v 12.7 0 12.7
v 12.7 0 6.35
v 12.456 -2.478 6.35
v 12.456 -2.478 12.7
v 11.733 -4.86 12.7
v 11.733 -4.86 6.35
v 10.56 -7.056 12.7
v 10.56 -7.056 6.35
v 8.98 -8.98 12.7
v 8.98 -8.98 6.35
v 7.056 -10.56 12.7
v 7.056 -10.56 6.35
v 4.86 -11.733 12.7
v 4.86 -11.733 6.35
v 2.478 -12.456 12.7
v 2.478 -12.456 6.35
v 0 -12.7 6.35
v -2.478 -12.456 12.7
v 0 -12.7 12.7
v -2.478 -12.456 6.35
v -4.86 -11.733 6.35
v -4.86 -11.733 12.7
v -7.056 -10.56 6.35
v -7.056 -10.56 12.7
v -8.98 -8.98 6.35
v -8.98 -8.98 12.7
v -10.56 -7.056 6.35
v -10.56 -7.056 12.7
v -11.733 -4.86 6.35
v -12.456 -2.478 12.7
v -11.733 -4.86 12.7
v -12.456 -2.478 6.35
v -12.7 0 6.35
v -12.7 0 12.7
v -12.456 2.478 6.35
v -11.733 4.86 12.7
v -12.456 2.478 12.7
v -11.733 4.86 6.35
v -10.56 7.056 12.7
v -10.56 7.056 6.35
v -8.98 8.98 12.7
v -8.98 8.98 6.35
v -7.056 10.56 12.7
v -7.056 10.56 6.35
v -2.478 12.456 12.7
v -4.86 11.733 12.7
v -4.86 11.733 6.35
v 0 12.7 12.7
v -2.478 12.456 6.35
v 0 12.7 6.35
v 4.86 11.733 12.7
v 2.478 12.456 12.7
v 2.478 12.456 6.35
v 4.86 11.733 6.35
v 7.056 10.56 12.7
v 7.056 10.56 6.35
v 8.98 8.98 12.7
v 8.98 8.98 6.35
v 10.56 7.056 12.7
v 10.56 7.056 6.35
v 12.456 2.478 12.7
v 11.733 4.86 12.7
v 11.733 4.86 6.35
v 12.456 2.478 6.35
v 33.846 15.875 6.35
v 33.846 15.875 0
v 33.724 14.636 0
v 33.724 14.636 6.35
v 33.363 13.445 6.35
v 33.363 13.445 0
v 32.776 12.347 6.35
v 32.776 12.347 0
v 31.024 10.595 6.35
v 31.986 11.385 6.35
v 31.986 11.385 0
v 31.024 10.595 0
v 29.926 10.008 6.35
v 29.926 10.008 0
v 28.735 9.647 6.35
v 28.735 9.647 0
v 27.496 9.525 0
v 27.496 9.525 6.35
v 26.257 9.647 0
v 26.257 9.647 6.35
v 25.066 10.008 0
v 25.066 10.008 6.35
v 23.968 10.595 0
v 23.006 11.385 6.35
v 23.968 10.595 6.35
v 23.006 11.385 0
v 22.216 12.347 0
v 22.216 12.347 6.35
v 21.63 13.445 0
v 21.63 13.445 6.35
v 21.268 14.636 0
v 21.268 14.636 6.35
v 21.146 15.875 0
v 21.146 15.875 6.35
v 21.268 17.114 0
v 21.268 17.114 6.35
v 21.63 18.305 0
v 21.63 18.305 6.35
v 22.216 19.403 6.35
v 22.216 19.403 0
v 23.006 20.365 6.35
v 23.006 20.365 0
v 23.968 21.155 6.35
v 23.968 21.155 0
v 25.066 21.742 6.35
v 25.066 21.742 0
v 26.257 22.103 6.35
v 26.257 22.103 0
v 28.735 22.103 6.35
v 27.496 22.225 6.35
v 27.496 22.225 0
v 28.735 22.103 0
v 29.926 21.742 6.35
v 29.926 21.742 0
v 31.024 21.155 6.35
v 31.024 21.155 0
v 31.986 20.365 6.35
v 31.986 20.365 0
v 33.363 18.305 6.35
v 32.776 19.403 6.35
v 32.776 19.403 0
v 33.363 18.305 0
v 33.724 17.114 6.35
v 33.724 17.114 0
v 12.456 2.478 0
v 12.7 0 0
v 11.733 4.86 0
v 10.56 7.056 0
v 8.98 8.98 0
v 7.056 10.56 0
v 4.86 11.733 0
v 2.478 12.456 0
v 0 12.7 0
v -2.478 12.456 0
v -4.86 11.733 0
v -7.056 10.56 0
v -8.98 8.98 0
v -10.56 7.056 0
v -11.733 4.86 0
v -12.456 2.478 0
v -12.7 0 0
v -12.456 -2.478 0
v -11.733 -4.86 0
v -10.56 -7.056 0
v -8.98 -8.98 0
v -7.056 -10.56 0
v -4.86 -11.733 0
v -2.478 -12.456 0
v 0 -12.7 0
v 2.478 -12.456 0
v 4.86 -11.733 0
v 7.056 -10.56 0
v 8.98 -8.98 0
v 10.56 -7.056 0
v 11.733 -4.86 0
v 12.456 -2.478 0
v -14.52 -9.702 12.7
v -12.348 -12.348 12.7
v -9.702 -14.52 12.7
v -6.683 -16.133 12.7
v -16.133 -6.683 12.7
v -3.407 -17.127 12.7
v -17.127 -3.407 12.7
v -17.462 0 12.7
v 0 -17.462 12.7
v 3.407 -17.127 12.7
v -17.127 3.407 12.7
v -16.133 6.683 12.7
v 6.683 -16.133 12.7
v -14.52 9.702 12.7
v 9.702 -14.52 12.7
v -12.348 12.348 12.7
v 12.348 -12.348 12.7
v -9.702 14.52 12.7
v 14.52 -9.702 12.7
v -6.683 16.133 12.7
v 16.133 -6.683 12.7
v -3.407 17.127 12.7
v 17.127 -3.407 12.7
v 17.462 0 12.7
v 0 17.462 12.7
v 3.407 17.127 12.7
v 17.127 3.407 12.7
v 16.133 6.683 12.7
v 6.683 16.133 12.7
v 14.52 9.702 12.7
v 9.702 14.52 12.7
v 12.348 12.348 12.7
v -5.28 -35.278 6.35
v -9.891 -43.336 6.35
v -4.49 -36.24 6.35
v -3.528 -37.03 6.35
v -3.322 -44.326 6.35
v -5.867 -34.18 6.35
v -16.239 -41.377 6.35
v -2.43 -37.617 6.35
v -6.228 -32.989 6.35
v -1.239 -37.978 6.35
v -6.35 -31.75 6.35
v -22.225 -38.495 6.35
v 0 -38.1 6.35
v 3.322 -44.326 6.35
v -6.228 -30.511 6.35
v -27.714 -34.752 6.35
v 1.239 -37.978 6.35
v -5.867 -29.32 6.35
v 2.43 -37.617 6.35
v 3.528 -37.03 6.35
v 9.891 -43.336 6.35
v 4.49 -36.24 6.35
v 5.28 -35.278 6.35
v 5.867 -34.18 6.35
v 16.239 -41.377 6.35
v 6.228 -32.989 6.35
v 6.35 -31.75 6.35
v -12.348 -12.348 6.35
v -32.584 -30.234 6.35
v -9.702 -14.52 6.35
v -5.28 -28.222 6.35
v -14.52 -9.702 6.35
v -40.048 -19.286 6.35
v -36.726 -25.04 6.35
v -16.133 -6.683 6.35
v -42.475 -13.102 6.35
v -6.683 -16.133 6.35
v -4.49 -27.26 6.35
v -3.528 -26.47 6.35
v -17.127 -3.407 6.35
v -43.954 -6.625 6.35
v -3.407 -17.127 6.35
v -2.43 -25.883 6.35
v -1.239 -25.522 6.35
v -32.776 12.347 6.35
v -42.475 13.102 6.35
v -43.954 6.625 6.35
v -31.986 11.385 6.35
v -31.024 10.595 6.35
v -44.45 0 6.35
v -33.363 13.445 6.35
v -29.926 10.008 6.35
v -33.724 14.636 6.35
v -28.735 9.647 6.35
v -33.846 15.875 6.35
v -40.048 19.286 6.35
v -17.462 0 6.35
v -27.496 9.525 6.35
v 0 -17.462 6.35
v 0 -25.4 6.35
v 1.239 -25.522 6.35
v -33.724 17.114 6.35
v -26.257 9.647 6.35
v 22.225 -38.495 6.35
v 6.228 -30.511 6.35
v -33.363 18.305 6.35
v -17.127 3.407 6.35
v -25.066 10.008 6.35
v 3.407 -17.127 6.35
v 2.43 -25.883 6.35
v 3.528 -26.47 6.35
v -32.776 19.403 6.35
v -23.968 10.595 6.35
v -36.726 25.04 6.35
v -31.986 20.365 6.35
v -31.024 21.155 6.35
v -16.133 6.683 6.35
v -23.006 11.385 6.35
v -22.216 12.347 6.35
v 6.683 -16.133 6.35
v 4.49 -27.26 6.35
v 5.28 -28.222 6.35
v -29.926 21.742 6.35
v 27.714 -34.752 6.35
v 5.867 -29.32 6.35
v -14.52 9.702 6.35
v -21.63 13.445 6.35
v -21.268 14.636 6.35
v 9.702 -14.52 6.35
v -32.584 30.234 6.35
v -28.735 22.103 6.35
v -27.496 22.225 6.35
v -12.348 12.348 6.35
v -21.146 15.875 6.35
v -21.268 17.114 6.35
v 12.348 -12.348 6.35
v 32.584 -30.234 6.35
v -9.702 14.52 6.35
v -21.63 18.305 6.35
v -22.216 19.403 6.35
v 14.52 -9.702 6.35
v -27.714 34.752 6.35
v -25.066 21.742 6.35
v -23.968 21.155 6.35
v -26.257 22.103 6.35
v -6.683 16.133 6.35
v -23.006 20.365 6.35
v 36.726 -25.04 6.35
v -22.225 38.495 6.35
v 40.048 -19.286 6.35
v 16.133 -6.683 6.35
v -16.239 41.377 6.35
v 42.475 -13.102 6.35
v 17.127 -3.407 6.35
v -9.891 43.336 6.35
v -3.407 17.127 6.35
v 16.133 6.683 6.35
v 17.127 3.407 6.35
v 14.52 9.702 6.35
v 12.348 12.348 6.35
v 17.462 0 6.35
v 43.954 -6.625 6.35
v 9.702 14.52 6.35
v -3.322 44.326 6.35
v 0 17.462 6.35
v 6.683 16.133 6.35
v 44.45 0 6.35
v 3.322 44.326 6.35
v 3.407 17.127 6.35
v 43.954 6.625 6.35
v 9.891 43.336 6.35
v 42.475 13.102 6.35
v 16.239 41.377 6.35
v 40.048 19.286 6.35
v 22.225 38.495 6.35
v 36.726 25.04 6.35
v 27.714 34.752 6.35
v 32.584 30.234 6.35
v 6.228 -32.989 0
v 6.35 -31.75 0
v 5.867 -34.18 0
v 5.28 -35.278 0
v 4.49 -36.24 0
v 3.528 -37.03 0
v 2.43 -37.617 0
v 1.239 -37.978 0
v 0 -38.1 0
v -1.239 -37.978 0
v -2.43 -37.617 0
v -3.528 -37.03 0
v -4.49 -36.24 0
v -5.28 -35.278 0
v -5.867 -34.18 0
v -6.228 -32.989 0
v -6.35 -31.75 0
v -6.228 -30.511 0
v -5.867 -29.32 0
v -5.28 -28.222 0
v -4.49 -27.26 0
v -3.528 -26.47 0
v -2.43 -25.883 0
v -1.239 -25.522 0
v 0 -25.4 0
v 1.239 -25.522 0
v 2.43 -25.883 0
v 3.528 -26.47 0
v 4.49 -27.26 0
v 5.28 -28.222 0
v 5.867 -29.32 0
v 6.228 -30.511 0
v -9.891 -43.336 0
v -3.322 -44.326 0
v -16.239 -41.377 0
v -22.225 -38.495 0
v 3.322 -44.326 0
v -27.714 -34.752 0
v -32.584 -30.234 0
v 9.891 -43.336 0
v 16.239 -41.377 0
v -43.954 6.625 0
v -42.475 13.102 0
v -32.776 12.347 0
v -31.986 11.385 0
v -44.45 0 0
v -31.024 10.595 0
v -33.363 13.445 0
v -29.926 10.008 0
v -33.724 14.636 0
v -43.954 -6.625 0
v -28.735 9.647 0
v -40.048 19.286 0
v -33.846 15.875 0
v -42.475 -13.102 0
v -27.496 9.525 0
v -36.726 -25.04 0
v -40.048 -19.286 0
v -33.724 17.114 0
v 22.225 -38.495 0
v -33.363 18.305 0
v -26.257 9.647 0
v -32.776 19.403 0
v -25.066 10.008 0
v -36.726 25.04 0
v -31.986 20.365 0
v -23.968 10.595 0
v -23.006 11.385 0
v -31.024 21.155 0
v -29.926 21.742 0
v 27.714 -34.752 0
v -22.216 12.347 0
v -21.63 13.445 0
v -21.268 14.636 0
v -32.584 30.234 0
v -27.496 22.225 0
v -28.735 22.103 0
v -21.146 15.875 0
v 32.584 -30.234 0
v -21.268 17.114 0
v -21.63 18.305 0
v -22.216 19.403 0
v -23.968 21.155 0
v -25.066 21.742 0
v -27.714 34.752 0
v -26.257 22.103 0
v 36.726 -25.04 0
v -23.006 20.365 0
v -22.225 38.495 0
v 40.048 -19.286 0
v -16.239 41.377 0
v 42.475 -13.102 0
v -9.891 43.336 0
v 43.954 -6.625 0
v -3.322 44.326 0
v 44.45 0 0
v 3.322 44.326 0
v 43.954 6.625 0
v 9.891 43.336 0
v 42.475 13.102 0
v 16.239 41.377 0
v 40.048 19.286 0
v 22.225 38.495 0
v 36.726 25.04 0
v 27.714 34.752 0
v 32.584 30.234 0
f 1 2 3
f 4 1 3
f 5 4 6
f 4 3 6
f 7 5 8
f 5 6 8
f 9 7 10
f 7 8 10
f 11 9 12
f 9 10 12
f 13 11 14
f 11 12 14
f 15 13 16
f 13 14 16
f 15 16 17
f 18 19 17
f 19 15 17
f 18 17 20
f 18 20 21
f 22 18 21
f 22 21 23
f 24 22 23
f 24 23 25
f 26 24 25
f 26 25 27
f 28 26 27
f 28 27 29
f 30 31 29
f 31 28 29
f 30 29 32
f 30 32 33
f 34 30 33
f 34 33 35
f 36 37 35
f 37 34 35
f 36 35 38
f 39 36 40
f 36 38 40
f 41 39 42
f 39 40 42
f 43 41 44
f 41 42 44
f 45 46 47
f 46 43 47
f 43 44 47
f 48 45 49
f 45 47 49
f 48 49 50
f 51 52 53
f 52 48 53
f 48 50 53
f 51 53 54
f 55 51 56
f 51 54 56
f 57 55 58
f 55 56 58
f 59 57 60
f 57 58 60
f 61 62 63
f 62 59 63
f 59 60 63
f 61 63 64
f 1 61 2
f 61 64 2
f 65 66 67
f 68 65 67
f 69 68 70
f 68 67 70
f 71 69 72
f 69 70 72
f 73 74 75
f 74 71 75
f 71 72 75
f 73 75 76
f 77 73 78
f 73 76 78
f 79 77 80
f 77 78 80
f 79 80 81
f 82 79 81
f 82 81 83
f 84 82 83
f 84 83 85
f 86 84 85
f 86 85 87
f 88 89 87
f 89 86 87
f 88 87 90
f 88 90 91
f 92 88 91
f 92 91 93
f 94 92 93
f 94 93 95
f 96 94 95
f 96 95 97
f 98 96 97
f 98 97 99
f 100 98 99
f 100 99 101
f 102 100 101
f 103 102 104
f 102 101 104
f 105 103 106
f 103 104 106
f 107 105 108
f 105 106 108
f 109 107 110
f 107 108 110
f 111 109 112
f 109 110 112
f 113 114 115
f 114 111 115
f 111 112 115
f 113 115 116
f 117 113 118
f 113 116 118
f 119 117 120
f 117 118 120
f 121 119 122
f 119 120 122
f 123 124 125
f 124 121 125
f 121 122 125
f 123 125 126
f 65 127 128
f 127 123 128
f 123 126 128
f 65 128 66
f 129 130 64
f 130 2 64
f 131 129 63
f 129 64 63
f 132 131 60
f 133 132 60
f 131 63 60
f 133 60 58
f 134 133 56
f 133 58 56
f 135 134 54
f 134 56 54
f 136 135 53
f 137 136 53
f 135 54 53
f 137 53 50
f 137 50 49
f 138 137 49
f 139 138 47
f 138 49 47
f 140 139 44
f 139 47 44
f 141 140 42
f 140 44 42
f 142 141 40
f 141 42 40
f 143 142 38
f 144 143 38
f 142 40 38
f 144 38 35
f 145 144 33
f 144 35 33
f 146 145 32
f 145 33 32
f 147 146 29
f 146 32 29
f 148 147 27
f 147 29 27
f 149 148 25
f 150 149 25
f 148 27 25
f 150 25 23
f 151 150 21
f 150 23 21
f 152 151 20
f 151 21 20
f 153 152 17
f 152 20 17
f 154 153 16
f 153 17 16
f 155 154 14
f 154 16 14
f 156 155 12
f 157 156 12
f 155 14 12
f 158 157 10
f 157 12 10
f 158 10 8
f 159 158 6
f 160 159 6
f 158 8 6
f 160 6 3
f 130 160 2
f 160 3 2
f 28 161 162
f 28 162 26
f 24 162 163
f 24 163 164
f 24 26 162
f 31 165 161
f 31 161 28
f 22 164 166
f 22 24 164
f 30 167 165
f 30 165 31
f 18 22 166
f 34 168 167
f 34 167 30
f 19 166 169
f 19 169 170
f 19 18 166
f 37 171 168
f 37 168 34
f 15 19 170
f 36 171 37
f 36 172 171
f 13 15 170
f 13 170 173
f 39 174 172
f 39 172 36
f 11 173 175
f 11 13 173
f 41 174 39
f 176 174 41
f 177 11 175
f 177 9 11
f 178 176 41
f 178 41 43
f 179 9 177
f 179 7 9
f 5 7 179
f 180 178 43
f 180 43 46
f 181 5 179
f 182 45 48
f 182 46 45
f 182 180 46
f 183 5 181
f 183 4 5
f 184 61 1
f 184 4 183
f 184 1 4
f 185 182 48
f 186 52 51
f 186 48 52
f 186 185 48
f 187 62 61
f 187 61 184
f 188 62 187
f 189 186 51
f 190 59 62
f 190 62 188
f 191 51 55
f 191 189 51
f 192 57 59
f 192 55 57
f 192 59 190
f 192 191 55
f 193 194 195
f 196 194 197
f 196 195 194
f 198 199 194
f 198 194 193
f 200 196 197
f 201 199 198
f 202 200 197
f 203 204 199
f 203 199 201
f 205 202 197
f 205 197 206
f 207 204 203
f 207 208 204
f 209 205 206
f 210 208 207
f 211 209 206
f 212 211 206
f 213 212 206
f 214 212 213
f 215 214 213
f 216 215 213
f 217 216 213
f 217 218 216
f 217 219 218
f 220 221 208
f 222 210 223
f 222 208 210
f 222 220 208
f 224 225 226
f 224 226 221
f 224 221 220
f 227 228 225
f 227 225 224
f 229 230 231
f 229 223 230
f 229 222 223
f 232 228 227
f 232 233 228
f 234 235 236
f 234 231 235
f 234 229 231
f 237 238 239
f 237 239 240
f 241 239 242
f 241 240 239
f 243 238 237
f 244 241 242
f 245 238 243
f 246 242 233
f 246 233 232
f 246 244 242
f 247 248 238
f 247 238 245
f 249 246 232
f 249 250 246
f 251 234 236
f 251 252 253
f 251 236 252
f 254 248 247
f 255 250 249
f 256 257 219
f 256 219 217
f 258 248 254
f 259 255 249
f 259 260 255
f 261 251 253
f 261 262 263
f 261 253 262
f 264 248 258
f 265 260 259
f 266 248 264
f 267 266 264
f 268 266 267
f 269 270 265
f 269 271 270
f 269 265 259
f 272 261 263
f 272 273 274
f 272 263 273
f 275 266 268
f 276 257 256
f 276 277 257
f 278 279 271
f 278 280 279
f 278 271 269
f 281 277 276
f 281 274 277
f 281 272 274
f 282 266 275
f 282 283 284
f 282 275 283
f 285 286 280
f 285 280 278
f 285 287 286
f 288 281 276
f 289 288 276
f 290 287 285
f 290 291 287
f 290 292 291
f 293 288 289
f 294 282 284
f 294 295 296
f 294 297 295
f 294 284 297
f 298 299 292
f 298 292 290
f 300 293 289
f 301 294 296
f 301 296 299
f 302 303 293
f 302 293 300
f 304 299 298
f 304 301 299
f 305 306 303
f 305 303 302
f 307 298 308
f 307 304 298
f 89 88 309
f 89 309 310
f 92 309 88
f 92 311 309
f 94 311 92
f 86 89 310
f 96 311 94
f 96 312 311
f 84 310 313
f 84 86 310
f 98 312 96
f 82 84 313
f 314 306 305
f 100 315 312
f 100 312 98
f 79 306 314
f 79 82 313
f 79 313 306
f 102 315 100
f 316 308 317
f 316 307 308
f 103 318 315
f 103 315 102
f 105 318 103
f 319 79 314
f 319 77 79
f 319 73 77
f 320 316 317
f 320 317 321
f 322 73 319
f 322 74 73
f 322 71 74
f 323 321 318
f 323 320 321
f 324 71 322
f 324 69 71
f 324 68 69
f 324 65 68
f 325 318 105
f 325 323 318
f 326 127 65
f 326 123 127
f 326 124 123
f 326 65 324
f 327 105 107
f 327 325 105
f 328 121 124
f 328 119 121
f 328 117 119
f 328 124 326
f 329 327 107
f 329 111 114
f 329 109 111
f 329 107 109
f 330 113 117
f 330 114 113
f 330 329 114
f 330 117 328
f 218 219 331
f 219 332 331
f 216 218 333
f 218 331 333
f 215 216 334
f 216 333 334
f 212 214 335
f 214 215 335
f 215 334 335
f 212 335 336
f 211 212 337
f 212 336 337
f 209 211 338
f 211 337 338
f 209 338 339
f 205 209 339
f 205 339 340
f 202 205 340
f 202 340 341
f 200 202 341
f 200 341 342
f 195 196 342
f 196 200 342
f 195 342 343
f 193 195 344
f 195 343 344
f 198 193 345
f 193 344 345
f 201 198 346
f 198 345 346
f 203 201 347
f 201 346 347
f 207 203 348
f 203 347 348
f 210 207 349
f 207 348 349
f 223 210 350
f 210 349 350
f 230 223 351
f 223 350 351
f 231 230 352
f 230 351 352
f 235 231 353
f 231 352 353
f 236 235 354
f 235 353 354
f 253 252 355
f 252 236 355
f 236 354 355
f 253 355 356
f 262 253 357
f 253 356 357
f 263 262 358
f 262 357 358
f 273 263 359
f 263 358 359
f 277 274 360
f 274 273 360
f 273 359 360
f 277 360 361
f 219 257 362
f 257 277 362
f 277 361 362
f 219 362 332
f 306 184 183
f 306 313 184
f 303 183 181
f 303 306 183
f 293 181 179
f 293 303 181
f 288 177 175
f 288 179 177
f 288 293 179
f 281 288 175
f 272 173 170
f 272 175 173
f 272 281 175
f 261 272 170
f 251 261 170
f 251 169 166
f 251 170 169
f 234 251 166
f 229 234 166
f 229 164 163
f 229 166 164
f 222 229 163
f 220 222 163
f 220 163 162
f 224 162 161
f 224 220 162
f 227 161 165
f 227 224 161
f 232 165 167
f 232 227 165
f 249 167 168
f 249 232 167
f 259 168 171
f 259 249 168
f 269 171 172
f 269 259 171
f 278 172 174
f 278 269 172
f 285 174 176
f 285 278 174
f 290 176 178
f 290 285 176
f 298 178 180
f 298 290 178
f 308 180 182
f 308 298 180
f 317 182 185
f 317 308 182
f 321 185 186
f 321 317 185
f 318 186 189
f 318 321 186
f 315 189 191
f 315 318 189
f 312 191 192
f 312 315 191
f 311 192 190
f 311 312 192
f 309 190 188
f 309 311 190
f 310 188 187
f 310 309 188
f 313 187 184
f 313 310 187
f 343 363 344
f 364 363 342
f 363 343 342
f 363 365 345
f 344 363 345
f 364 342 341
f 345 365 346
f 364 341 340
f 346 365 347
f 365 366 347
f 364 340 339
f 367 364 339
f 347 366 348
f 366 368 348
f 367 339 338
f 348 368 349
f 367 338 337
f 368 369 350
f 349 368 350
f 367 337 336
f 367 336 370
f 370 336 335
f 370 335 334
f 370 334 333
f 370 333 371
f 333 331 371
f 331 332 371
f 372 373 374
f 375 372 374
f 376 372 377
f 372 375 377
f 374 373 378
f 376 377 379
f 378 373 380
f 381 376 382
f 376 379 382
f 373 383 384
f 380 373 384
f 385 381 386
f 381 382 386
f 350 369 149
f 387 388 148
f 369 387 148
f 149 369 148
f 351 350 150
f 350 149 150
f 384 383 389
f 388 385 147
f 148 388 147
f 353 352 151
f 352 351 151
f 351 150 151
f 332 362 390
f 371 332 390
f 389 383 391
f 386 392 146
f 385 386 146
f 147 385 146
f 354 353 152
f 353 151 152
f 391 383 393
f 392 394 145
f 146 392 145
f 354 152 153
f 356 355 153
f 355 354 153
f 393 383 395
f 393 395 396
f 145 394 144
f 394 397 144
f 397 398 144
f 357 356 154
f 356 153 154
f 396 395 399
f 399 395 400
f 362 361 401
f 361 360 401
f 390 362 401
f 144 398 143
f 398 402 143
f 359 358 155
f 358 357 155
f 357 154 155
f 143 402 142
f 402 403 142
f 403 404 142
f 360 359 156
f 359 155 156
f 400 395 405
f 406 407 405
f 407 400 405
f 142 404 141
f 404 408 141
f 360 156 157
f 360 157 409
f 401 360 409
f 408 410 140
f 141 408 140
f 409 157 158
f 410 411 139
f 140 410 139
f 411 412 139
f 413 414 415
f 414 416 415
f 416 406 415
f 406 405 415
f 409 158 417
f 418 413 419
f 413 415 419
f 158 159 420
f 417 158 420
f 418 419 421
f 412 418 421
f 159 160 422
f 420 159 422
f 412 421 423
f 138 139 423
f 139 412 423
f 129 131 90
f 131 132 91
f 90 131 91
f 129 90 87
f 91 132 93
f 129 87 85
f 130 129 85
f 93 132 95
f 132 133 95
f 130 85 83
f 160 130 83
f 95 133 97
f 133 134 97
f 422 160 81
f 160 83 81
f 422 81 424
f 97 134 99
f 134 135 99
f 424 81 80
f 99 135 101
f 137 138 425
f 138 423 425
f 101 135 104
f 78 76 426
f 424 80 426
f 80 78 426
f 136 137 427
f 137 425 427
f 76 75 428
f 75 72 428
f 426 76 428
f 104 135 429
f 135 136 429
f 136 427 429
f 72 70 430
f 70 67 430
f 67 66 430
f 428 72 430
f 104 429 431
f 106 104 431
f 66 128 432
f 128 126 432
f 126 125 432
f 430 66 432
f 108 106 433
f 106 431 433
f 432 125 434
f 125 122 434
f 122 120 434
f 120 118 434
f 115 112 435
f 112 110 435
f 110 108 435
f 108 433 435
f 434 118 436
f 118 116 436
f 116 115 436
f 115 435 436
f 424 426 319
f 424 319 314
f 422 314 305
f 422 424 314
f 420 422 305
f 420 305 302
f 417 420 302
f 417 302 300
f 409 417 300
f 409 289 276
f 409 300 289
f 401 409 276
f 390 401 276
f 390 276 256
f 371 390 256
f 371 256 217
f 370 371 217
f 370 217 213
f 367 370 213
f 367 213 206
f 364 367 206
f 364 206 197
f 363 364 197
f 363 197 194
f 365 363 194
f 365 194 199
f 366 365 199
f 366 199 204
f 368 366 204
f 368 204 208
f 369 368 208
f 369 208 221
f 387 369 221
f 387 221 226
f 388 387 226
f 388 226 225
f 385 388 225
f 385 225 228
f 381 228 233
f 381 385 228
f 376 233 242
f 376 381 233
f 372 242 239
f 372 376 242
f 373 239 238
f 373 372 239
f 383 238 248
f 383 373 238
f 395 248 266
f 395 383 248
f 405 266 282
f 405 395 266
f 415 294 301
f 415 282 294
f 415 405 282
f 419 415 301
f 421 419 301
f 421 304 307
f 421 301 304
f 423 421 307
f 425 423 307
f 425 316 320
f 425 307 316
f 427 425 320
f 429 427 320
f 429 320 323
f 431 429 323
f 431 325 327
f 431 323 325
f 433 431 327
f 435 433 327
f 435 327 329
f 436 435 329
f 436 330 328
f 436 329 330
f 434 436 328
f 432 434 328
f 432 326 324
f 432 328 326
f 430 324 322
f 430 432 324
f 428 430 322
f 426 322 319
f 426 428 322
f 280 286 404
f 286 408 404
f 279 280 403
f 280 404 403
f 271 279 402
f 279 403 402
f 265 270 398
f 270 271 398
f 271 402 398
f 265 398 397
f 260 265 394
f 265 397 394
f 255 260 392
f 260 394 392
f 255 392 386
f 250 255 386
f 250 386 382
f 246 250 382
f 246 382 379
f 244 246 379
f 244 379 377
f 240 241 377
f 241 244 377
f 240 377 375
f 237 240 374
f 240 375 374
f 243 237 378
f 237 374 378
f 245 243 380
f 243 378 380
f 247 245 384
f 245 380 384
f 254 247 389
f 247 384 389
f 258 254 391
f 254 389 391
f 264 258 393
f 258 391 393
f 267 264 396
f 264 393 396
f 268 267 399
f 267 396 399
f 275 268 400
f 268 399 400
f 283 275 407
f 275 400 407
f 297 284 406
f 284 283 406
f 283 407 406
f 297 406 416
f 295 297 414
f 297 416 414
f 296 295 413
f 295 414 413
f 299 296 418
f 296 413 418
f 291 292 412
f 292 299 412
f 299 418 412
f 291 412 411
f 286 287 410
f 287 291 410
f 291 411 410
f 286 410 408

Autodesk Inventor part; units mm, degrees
ref_plane "YZ Plane" through (0, 0, 0) normal (1, 0, 0) x (0, 1, 0)
ref_plane "XZ Plane" through (0, 0, 0) normal (0, 1, 0) x (-1, 0, 0)
ref_plane "XY Plane" through (0, 0, 0) normal (0, 0, 1) x (1, 0, 0)
sketch "Sketch1" plane through (0, 0, 0) normal (0, 0, 1) x (1, 0, 0)
  circle A0 centre (0, 0) radius 44.45
  circle A1 centre (-27.4963, 15.875) radius 6.35
  circle A2 centre (27.4963, 15.875) radius 6.35
  circle A3 centre (0, -31.75) radius 6.35
  dimension "d1" = 88.9
  dimension "d7" = 12.7
  dimension "d8" = 12.7
  dimension "d9" = 12.7
extrude "Extrusion3" add sketch "Sketch1" along normal blind 6.35
sketch "Sketch2" plane through (0, 0, 6.35) normal (0, 0, 1) x (1, 0, 0)
  circle A0 centre (0, 0) radius 12.7
  circle A1 centre (0, 0) radius 17.4625
  dimension "d16" = 25.4
  dimension "d17" = 34.925
extrude "Extrusion4" add sketch "Sketch2" along normal blind 6.35
sketch "Sketch3" plane through (0, 0, 6.35) normal (0, 0, 1) x (1, 0, 0)
  circle A0 centre (0, 0) radius 12.7
  dimension "d20" = 25.4
extrude "Extrusion5" cut sketch "Sketch3" against normal through all
properties part number "Assignment 1.6 Circular Spacer"
